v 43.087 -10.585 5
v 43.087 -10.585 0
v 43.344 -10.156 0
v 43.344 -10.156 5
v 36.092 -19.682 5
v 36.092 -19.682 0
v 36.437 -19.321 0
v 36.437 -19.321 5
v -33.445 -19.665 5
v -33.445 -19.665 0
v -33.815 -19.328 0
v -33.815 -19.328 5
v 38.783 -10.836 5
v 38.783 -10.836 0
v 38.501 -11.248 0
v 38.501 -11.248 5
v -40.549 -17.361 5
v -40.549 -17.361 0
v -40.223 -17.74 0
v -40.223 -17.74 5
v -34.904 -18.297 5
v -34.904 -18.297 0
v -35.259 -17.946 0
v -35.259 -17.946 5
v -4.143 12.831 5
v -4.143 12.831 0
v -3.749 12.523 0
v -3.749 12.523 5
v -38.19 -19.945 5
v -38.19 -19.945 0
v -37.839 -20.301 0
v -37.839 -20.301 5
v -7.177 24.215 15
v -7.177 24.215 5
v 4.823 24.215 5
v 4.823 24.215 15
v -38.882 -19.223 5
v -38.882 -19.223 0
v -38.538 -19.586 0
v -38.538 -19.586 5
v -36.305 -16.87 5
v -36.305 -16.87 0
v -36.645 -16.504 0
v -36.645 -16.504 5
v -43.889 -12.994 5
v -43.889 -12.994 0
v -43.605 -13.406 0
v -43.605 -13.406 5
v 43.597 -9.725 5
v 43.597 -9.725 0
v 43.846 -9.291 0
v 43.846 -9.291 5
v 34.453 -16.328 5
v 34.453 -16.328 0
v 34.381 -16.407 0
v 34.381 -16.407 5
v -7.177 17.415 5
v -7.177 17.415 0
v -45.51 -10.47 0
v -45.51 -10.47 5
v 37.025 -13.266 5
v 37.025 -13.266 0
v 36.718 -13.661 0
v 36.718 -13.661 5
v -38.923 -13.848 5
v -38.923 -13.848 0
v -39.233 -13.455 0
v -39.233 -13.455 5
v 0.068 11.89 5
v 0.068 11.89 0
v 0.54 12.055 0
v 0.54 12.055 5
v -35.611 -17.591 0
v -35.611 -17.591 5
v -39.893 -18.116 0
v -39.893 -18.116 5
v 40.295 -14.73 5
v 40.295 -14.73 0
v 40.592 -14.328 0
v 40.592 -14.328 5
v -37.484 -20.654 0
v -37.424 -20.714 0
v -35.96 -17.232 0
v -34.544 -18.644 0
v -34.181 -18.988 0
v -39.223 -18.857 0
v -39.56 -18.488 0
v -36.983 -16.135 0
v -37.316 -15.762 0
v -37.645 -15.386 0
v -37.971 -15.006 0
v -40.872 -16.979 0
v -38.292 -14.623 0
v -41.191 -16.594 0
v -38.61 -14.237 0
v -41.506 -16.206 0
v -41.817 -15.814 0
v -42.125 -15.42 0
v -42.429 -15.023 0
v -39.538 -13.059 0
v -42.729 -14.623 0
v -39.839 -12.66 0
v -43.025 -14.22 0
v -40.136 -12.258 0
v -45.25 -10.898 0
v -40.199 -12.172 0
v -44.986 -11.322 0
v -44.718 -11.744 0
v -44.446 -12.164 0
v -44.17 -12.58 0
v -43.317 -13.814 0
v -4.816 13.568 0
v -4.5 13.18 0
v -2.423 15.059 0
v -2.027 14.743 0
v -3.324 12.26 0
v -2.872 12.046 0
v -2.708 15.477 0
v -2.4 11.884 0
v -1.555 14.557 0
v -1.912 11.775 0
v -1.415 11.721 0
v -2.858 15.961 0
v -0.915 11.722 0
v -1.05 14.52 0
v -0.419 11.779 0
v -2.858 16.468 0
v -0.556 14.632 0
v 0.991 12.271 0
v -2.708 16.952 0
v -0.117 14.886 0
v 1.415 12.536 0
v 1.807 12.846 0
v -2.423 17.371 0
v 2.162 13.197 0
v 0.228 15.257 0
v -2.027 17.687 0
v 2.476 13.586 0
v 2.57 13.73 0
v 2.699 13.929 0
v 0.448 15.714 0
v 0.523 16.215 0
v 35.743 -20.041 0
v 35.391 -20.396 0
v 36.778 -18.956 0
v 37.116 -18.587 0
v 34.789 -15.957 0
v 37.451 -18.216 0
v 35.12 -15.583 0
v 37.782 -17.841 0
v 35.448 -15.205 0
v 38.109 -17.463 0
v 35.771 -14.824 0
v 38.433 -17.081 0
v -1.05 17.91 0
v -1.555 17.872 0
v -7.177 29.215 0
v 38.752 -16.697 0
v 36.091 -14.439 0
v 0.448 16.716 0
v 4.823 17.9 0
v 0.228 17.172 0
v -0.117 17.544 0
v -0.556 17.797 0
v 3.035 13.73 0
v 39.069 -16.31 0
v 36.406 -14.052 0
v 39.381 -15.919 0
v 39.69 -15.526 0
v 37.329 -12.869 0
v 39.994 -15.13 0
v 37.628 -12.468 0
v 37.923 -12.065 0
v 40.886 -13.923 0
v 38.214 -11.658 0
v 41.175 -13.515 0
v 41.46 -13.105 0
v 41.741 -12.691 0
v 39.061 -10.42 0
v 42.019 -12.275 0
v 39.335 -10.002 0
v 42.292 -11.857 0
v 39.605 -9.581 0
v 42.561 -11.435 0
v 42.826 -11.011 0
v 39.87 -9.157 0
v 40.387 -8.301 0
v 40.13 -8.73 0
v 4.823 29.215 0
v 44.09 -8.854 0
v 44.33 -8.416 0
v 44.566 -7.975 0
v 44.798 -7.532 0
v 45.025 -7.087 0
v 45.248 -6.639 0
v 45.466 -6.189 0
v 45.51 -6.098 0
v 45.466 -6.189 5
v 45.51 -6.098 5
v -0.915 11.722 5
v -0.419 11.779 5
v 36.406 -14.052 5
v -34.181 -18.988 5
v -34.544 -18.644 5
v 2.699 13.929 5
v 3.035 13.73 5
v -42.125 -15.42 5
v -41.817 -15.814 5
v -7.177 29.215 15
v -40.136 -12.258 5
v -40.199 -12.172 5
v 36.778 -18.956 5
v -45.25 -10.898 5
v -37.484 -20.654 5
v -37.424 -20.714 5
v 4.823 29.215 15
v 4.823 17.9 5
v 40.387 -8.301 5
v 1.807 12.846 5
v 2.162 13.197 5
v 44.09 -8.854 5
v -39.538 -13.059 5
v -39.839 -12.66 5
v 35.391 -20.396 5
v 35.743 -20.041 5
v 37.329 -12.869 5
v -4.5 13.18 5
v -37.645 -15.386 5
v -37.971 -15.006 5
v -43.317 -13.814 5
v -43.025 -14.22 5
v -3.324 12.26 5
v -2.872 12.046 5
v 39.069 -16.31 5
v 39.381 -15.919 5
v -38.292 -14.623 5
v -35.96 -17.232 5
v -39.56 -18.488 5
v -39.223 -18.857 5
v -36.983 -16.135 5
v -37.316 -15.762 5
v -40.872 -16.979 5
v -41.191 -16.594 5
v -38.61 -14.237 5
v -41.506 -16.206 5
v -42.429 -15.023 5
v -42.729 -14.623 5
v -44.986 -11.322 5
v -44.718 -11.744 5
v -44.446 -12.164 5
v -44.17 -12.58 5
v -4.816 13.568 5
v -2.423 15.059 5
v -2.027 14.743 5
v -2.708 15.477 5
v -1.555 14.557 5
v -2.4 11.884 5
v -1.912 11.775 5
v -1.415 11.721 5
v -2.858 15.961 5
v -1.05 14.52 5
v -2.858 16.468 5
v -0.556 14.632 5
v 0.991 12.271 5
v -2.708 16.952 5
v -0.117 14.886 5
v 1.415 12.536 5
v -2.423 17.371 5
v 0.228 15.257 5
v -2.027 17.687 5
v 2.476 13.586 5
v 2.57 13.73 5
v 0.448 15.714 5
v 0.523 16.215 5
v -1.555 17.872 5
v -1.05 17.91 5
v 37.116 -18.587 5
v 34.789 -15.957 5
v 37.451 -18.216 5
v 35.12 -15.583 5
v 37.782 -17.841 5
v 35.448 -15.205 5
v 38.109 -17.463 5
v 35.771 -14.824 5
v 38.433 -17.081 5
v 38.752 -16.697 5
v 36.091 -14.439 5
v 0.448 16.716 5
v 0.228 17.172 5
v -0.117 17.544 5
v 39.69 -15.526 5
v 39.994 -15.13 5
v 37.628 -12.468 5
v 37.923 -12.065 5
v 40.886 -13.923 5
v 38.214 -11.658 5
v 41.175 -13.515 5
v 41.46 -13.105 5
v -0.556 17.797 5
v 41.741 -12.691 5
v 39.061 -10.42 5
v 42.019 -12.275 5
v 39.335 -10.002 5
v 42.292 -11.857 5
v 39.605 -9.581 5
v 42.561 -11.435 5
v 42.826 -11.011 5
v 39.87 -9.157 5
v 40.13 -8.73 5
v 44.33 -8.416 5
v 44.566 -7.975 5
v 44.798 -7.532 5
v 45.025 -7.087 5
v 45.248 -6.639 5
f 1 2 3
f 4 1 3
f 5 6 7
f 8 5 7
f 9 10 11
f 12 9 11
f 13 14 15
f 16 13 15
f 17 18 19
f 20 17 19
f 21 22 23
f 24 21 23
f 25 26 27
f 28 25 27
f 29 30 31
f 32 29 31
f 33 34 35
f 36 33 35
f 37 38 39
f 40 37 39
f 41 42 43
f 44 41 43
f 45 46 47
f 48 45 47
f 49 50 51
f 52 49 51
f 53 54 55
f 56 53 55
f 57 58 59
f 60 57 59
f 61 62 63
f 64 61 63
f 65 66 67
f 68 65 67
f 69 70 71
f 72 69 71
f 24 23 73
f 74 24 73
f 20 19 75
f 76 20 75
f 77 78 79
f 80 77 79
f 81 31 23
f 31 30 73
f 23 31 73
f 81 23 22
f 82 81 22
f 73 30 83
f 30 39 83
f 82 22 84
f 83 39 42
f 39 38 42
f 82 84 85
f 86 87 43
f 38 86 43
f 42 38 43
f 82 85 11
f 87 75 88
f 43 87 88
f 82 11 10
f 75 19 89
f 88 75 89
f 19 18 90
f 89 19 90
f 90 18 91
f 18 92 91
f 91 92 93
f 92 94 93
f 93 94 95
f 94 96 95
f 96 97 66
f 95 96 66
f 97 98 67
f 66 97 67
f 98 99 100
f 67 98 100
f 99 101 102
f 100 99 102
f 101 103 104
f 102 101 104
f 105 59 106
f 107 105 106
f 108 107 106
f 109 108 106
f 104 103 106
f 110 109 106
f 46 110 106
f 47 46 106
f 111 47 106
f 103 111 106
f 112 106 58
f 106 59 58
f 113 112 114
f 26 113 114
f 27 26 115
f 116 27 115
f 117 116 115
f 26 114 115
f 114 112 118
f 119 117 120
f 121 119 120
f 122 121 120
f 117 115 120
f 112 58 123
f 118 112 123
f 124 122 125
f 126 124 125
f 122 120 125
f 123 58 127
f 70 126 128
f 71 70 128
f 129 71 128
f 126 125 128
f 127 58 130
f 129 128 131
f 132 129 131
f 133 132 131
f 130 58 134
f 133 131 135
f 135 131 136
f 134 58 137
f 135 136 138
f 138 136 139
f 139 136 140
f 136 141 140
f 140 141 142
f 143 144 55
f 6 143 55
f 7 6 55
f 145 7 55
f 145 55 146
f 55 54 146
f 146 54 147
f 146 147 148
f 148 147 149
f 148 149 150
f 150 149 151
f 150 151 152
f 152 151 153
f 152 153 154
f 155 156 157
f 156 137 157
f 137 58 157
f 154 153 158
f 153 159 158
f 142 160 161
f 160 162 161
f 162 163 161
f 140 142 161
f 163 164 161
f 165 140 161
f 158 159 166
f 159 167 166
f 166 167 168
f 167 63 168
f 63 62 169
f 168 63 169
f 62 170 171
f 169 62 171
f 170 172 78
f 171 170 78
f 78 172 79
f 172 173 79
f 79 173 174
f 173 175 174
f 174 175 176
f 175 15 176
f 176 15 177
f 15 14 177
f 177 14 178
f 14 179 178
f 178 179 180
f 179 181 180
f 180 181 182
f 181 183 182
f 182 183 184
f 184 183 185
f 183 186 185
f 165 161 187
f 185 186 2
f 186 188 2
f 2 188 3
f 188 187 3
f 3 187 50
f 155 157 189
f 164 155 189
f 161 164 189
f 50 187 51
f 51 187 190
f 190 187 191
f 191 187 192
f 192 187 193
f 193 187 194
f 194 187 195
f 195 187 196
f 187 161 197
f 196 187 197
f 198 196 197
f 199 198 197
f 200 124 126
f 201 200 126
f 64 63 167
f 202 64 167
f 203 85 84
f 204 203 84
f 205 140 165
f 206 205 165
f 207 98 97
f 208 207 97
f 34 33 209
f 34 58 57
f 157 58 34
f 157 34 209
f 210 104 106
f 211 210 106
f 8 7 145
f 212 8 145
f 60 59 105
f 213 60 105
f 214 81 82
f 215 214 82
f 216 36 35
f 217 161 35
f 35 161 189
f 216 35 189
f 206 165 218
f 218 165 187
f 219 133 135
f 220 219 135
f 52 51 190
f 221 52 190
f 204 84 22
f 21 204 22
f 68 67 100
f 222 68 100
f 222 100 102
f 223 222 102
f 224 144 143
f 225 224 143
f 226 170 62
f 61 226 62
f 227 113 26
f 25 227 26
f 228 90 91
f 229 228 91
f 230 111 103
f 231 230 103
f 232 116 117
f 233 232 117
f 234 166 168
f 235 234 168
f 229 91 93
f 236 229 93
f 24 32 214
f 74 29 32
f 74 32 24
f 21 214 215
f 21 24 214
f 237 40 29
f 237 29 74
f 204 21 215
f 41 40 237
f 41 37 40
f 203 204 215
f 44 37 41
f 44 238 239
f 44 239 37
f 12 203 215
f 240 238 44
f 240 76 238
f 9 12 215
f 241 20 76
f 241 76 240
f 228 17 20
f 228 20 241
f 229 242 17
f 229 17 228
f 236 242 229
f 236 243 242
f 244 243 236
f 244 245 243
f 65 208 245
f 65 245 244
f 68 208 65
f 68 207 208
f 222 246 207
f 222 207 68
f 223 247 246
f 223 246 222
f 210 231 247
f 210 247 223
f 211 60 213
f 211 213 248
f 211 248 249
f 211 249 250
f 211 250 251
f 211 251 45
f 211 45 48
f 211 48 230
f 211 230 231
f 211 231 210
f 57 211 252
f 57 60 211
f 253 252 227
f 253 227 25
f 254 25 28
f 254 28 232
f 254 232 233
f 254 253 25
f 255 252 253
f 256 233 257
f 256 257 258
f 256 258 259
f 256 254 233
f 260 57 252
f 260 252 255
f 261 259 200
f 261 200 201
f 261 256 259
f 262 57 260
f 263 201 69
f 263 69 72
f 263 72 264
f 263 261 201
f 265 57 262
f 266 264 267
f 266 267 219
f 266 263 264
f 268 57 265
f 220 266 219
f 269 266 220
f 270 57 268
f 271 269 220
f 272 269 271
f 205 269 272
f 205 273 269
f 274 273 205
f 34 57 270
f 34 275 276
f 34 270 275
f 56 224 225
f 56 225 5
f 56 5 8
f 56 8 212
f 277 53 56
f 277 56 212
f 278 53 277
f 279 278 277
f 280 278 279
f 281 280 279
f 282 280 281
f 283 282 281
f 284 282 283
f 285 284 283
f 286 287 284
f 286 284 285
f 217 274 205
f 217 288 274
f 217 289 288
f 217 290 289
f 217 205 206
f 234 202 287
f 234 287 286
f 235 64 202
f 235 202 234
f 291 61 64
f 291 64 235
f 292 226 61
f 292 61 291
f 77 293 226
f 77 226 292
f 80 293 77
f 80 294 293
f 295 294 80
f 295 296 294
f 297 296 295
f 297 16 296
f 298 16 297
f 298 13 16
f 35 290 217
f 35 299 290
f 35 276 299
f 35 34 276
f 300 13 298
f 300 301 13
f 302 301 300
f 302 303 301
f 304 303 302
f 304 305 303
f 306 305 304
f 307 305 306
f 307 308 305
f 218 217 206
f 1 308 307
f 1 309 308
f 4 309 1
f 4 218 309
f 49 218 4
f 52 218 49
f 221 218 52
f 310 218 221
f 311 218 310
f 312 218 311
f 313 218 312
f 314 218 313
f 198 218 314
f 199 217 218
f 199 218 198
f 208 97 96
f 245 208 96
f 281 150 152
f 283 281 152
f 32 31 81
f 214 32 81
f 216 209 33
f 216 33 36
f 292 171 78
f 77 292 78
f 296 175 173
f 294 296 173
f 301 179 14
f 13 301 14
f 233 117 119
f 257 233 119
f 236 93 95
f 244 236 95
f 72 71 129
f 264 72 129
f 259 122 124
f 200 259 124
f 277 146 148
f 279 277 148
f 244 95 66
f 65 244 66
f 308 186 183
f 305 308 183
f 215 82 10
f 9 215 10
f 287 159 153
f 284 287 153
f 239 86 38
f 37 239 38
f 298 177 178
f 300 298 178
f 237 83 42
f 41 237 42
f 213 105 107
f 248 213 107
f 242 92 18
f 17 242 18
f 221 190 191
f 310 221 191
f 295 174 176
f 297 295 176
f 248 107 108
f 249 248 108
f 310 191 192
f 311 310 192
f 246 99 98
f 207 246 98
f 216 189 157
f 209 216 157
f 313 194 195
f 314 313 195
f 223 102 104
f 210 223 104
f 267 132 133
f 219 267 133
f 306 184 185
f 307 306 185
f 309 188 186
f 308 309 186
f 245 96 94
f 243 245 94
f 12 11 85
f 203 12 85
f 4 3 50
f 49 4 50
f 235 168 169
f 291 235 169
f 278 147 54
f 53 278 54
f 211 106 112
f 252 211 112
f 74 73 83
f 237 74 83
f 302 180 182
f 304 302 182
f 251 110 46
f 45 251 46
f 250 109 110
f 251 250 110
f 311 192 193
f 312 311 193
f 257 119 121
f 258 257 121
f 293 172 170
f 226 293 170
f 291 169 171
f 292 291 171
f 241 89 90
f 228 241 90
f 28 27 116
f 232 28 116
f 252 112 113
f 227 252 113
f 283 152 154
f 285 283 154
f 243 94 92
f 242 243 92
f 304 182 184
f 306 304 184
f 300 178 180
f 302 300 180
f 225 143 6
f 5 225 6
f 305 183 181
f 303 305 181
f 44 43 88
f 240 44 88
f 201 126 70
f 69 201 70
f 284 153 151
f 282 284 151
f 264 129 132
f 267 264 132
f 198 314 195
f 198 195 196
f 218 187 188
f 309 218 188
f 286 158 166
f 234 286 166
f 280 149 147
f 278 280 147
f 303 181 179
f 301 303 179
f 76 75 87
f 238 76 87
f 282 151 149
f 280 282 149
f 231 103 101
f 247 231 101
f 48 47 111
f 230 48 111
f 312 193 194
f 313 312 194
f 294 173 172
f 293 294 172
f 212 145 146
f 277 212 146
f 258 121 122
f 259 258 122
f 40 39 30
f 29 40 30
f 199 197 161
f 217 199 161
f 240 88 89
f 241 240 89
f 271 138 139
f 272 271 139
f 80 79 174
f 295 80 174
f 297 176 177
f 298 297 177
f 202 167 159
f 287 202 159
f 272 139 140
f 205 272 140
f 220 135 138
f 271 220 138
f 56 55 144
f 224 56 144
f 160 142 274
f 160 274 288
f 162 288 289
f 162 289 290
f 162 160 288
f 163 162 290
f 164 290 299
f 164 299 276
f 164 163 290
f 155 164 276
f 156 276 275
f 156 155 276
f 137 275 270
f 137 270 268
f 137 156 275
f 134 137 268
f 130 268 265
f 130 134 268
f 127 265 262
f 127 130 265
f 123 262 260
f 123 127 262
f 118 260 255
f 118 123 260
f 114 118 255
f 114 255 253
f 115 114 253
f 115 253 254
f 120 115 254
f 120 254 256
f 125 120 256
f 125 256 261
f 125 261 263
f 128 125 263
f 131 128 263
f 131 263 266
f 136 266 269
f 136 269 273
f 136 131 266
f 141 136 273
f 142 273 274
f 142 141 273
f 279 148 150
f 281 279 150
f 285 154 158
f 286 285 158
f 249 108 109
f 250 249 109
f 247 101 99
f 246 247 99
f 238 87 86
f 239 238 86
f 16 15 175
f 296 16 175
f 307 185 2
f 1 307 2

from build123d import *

# Parameters (mm, degrees)
F0_R     = 1.7
F1_DEPTH = 5
F0_W     = 4.5
F0_H     = 5
F0_W_2   = 3
F2_DEPTH = 15


# Not quite as in the source:
# - a feature names something its author has since deleted; it is built from what else it names


with BuildPart() as f1:
    # F0 (on Top) → F1 (new body)
    with BuildSketch(Plane.XY):
        with BuildLine():
            Line((-37.42359, -20.713661), (-33.444589, -19.664665))
            Line((-33.444589, -19.664665), (-33.814619, -19.328399))
            Line((-33.814619, -19.328399), (-34.181145, -18.988316))
            Line((-34.181145, -18.988316), (-34.544128, -18.644454))
            Line((-34.544128, -18.644454), (-34.903529, -18.29685))
            Line((-34.903529, -18.29685), (-35.259309, -17.94554))
            Line((-35.259309, -17.94554), (-35.611429, -17.590562))
            Line((-35.611429, -17.590562), (-35.959853, -17.231955))
            Line((-35.959853, -17.231955), (-36.304542, -16.869758))
            Line((-36.304542, -16.869758), (-36.645459, -16.504008))
            Line((-36.645459, -16.504008), (-36.982569, -16.134745))
            Line((-36.982569, -16.134745), (-37.315835, -15.76201))
            Line((-37.315835, -15.76201), (-37.64522, -15.385841))
            Line((-37.64522, -15.385841), (-37.97069, -15.00628))
            Line((-37.97069, -15.00628), (-38.29221, -14.623366))
            Line((-38.29221, -14.623366), (-38.609746, -14.237142))
            Line((-38.609746, -14.237142), (-38.923262, -13.847648))
            Line((-38.923262, -13.847648), (-39.232726, -13.454927))
            Line((-39.232726, -13.454927), (-39.538104, -13.059021))
            Line((-39.538104, -13.059021), (-39.839363, -12.659971))
            Line((-39.839363, -12.659971), (-40.136472, -12.257822))
            Line((-40.136472, -12.257822), (-40.199223, -12.171758))
            Line((-40.199223, -12.171758), (-4.815801, 13.567638))
            Line((-4.815801, 13.567638), (-4.499835, 13.180458))
            Line((-4.499835, 13.180458), (-4.142886, 12.8307))
            Line((-4.142886, 12.8307), (-3.749356, 12.522679))
            Line((-3.749356, 12.522679), (-3.324099, 12.260193))
            Line((-3.324099, 12.260193), (-2.872359, 12.046479))
            Line((-2.872359, 12.046479), (-2.399707, 11.884173))
            Line((-2.399707, 11.884173), (-1.911973, 11.775276))
            Line((-1.911973, 11.775276), (-1.415172, 11.721133))
            Line((-1.415172, 11.721133), (-0.91543, 11.72241))
            Line((-0.91543, 11.72241), (-0.418912, 11.779092))
            Line((-0.418912, 11.779092), (0.068259, 11.890479))
            Line((0.068259, 11.890479), (0.540075, 12.055198))
            Line((0.540075, 12.055198), (0.990717, 12.271218))
            Line((0.990717, 12.271218), (1.414627, 12.535874))
            Line((1.414627, 12.535874), (1.806578, 12.845903))
            Line((1.806578, 12.845903), (2.161735, 13.19748))
            Line((2.161735, 13.19748), (2.475718, 13.58627))
            Line((2.475718, 13.58627), (2.5697381369, 13.7302913689))
            Line((2.5697381369, 13.7302913689), (1.9580461126, 13.7302913689))
            ThreePointArc((1.9580461126, 13.7302913689), (-1.176782, 12.214814), (-4.3116101126, 13.7302913689))
            Line((-4.3116101126, 13.7302913689), (-7.176782, 13.7302913689))
            Line((-7.176782, 13.7302913689), (-7.176782, 17.4148470867))
            Line((-7.176782, 17.4148470867), (-45.510085, -10.470418))
            Line((-45.510085, -10.470418), (-45.250166, -10.897548))
            Line((-45.250166, -10.897548), (-44.986132, -11.322146))
            Line((-44.986132, -11.322146), (-44.718008, -11.744174))
            Line((-44.718008, -11.744174), (-44.445818, -12.163591))
            Line((-44.445818, -12.163591), (-44.169588, -12.580359))
            Line((-44.169588, -12.580359), (-43.889344, -12.994438))
            Line((-43.889344, -12.994438), (-43.605112, -13.405789))
            Line((-43.605112, -13.405789), (-43.316919, -13.814376))
            Line((-43.316919, -13.814376), (-43.024791, -14.220158))
            Line((-43.024791, -14.220158), (-42.728755, -14.623099))
            Line((-42.728755, -14.623099), (-42.428841, -15.02316))
            Line((-42.428841, -15.02316), (-42.125074, -15.420305))
            Line((-42.125074, -15.420305), (-41.817484, -15.814496))
            Line((-41.817484, -15.814496), (-41.5061, -16.205696))
            Line((-41.5061, -16.205696), (-41.19095, -16.59387))
            Line((-41.19095, -16.59387), (-40.872064, -16.97898))
            Line((-40.872064, -16.97898), (-40.549472, -17.360991))
            Line((-40.549472, -17.360991), (-40.223203, -17.739867))
            Line((-40.223203, -17.739867), (-39.893289, -18.115572))
            Line((-39.893289, -18.115572), (-39.55976, -18.488072))
            Line((-39.55976, -18.488072), (-39.222648, -18.857333))
            Line((-39.222648, -18.857333), (-38.881982, -19.223318))
            Line((-38.881982, -19.223318), (-38.537797, -19.585995))
            Line((-38.537797, -19.585995), (-38.190123, -19.945329))
            Line((-38.190123, -19.945329), (-37.838993, -20.301287))
            Line((-37.838993, -20.301287), (-37.484441, -20.653835))
            Line((-37.484441, -20.653835), (-37.42359, -20.713661))
        make_face()
        with BuildLine():
            Line((-3.823958, 19.853833), (-7.176782, 17.4148470867))
            Line((-7.176782, 17.4148470867), (-7.176782, 13.7302913689))
            Line((-7.176782, 13.7302913689), (-4.3116101126, 13.7302913689))
            ThreePointArc((-4.3116101126, 13.7302913689), (-2.4922073209, 19.9923338511), (2.823218, 16.214814))
            ThreePointArc((2.823218, 16.214814), (2.6007378511, 14.8993886791), (1.9580461126, 13.7302913689))
            Line((1.9580461126, 13.7302913689), (2.5697381369, 13.7302913689))
            Line((2.5697381369, 13.7302913689), (2.699204, 13.928609))
            Line((2.699204, 13.928609), (3.0354278194, 13.7302913689))
            Line((3.0354278194, 13.7302913689), (4.823218, 13.7302913689))
            Line((4.823218, 13.7302913689), (4.823218, 17.9002620213))
            Line((4.823218, 17.9002620213), (1.109423, 20.0908))
            Line((1.109423, 20.0908), (0.665545, 20.320399))
            Line((0.665545, 20.320399), (0.198946, 20.499364))
            Line((0.198946, 20.499364), (-0.284619, 20.625488))
            Line((-0.284619, 20.625488), (-0.779188, 20.697215))
            Line((-0.779188, 20.697215), (-1.27866, 20.713661))
            Line((-1.27866, 20.713661), (-1.776876, 20.674622))
            Line((-1.776876, 20.674622), (-2.267691, 20.580581))
            Line((-2.267691, 20.580581), (-2.745051, 20.432696))
            Line((-2.745051, 20.432696), (-3.20307, 20.232793))
            Line((-3.20307, 20.232793), (-3.636099, 19.983336))
            Line((-3.636099, 19.983336), (-3.823958, 19.853833))
        make_face()
        Polygon((4.823218, 13.7302913689), (3.0354278194, 13.7302913689), (40.38674, -8.300937), (40.13049, -8.730279), (39.869806, -9.156942), (39.604715, -9.580881), (39.335246, -10.002051), (39.061427, -10.420406), (38.783288, -10.835901), (38.500859, -11.248493), (38.21417, -11.658135), (37.923252, -12.064786), (37.628136, -12.4684), (37.328853, -12.868934), (37.025437, -13.266346), (36.71792, -13.660593), (36.406334, -14.051633), (36.090712, -14.439423), (35.77109, -14.823922), (35.447501, -15.205088), (35.11998, -15.582882), (34.788562, -15.957261), (34.453283, -16.328186), (34.381366, -16.406751), (35.390903, -20.395946), (35.742952, -20.040897), (36.091554, -19.682463), (36.436676, -19.320678), (36.778286, -18.955574), (37.116352, -18.587187), (37.450843, -18.21555), (37.781727, -17.840698), (38.108974, -17.462667), (38.432553, -17.081492), (38.752433, -16.697207), (39.068585, -16.30985), (39.38098, -15.919456), (39.689588, -15.526061), (39.99438, -15.129703), (40.295328, -14.730418), (40.592404, -14.328244), (40.885581, -13.923219), (41.174829, -13.515379), (41.460124, -13.104763), (41.741437, -12.69141), (42.018744, -12.275358), (42.292017, -11.856646), (42.561231, -11.435313), (42.826362, -11.011398), (43.087385, -10.584942), (43.344274, -10.155983), (43.597007, -9.724561), (43.845559, -9.290718), (44.089907, -8.854494), (44.330029, -8.415928), (44.565902, -7.975063), (44.797505, -7.53194), (45.024814, -7.086599), (45.24781, -6.639083), (45.466471, -6.189433), (45.510086, -6.098405), (4.823218, 17.9002620213), align=None)
        Polygon((-7.176782, 24.214814), (-7.176782, 17.4148470867), (-3.823958, 19.853833), (-3.636099, 19.983336), (-3.20307, 20.232793), (-2.745051, 20.432696), (-2.267691, 20.580581), (-1.776876, 20.674622), (-1.27866, 20.713661), (-0.779188, 20.697215), (-0.284619, 20.625488), (0.198946, 20.499364), (0.665545, 20.320399), (1.109423, 20.0908), (4.823218, 17.9002620213), (4.823218, 24.214814), (0.323218, 24.214814), (-2.676782, 24.214814), align=None)
        with BuildLine():
            ThreePointArc((2.823218, 16.214814), (-2.4922073209, 19.9923338511), (-4.3116101126, 13.7302913689))
            Line((-4.3116101126, 13.7302913689), (1.9580461126, 13.7302913689))
            ThreePointArc((1.9580461126, 13.7302913689), (2.6007378511, 14.8993886791), (2.823218, 16.214814))
        make_face()
        with Locations((-1.176782, 16.214814)):
            Circle(F0_R, mode=Mode.SUBTRACT)
        with BuildLine():
            Line((1.9580461126, 13.7302913689), (-4.3116101126, 13.7302913689))
            ThreePointArc((-4.3116101126, 13.7302913689), (-1.176782, 12.214814), (1.9580461126, 13.7302913689))
        make_face()
    extrude(amount=F1_DEPTH)

    # F0 (on Top) → F2 (join)
    with BuildSketch(Plane.XY):
        with Locations((-4.926782, 26.714814)):
            Rectangle(F0_W, F0_H)
        with Locations((2.573218, 26.714814)):
            Rectangle(F0_W, F0_H)
        with Locations((-1.176782, 26.714814)):
            Rectangle(F0_W_2, F0_H)
    extrude(amount=F2_DEPTH)


solid = f1.part
